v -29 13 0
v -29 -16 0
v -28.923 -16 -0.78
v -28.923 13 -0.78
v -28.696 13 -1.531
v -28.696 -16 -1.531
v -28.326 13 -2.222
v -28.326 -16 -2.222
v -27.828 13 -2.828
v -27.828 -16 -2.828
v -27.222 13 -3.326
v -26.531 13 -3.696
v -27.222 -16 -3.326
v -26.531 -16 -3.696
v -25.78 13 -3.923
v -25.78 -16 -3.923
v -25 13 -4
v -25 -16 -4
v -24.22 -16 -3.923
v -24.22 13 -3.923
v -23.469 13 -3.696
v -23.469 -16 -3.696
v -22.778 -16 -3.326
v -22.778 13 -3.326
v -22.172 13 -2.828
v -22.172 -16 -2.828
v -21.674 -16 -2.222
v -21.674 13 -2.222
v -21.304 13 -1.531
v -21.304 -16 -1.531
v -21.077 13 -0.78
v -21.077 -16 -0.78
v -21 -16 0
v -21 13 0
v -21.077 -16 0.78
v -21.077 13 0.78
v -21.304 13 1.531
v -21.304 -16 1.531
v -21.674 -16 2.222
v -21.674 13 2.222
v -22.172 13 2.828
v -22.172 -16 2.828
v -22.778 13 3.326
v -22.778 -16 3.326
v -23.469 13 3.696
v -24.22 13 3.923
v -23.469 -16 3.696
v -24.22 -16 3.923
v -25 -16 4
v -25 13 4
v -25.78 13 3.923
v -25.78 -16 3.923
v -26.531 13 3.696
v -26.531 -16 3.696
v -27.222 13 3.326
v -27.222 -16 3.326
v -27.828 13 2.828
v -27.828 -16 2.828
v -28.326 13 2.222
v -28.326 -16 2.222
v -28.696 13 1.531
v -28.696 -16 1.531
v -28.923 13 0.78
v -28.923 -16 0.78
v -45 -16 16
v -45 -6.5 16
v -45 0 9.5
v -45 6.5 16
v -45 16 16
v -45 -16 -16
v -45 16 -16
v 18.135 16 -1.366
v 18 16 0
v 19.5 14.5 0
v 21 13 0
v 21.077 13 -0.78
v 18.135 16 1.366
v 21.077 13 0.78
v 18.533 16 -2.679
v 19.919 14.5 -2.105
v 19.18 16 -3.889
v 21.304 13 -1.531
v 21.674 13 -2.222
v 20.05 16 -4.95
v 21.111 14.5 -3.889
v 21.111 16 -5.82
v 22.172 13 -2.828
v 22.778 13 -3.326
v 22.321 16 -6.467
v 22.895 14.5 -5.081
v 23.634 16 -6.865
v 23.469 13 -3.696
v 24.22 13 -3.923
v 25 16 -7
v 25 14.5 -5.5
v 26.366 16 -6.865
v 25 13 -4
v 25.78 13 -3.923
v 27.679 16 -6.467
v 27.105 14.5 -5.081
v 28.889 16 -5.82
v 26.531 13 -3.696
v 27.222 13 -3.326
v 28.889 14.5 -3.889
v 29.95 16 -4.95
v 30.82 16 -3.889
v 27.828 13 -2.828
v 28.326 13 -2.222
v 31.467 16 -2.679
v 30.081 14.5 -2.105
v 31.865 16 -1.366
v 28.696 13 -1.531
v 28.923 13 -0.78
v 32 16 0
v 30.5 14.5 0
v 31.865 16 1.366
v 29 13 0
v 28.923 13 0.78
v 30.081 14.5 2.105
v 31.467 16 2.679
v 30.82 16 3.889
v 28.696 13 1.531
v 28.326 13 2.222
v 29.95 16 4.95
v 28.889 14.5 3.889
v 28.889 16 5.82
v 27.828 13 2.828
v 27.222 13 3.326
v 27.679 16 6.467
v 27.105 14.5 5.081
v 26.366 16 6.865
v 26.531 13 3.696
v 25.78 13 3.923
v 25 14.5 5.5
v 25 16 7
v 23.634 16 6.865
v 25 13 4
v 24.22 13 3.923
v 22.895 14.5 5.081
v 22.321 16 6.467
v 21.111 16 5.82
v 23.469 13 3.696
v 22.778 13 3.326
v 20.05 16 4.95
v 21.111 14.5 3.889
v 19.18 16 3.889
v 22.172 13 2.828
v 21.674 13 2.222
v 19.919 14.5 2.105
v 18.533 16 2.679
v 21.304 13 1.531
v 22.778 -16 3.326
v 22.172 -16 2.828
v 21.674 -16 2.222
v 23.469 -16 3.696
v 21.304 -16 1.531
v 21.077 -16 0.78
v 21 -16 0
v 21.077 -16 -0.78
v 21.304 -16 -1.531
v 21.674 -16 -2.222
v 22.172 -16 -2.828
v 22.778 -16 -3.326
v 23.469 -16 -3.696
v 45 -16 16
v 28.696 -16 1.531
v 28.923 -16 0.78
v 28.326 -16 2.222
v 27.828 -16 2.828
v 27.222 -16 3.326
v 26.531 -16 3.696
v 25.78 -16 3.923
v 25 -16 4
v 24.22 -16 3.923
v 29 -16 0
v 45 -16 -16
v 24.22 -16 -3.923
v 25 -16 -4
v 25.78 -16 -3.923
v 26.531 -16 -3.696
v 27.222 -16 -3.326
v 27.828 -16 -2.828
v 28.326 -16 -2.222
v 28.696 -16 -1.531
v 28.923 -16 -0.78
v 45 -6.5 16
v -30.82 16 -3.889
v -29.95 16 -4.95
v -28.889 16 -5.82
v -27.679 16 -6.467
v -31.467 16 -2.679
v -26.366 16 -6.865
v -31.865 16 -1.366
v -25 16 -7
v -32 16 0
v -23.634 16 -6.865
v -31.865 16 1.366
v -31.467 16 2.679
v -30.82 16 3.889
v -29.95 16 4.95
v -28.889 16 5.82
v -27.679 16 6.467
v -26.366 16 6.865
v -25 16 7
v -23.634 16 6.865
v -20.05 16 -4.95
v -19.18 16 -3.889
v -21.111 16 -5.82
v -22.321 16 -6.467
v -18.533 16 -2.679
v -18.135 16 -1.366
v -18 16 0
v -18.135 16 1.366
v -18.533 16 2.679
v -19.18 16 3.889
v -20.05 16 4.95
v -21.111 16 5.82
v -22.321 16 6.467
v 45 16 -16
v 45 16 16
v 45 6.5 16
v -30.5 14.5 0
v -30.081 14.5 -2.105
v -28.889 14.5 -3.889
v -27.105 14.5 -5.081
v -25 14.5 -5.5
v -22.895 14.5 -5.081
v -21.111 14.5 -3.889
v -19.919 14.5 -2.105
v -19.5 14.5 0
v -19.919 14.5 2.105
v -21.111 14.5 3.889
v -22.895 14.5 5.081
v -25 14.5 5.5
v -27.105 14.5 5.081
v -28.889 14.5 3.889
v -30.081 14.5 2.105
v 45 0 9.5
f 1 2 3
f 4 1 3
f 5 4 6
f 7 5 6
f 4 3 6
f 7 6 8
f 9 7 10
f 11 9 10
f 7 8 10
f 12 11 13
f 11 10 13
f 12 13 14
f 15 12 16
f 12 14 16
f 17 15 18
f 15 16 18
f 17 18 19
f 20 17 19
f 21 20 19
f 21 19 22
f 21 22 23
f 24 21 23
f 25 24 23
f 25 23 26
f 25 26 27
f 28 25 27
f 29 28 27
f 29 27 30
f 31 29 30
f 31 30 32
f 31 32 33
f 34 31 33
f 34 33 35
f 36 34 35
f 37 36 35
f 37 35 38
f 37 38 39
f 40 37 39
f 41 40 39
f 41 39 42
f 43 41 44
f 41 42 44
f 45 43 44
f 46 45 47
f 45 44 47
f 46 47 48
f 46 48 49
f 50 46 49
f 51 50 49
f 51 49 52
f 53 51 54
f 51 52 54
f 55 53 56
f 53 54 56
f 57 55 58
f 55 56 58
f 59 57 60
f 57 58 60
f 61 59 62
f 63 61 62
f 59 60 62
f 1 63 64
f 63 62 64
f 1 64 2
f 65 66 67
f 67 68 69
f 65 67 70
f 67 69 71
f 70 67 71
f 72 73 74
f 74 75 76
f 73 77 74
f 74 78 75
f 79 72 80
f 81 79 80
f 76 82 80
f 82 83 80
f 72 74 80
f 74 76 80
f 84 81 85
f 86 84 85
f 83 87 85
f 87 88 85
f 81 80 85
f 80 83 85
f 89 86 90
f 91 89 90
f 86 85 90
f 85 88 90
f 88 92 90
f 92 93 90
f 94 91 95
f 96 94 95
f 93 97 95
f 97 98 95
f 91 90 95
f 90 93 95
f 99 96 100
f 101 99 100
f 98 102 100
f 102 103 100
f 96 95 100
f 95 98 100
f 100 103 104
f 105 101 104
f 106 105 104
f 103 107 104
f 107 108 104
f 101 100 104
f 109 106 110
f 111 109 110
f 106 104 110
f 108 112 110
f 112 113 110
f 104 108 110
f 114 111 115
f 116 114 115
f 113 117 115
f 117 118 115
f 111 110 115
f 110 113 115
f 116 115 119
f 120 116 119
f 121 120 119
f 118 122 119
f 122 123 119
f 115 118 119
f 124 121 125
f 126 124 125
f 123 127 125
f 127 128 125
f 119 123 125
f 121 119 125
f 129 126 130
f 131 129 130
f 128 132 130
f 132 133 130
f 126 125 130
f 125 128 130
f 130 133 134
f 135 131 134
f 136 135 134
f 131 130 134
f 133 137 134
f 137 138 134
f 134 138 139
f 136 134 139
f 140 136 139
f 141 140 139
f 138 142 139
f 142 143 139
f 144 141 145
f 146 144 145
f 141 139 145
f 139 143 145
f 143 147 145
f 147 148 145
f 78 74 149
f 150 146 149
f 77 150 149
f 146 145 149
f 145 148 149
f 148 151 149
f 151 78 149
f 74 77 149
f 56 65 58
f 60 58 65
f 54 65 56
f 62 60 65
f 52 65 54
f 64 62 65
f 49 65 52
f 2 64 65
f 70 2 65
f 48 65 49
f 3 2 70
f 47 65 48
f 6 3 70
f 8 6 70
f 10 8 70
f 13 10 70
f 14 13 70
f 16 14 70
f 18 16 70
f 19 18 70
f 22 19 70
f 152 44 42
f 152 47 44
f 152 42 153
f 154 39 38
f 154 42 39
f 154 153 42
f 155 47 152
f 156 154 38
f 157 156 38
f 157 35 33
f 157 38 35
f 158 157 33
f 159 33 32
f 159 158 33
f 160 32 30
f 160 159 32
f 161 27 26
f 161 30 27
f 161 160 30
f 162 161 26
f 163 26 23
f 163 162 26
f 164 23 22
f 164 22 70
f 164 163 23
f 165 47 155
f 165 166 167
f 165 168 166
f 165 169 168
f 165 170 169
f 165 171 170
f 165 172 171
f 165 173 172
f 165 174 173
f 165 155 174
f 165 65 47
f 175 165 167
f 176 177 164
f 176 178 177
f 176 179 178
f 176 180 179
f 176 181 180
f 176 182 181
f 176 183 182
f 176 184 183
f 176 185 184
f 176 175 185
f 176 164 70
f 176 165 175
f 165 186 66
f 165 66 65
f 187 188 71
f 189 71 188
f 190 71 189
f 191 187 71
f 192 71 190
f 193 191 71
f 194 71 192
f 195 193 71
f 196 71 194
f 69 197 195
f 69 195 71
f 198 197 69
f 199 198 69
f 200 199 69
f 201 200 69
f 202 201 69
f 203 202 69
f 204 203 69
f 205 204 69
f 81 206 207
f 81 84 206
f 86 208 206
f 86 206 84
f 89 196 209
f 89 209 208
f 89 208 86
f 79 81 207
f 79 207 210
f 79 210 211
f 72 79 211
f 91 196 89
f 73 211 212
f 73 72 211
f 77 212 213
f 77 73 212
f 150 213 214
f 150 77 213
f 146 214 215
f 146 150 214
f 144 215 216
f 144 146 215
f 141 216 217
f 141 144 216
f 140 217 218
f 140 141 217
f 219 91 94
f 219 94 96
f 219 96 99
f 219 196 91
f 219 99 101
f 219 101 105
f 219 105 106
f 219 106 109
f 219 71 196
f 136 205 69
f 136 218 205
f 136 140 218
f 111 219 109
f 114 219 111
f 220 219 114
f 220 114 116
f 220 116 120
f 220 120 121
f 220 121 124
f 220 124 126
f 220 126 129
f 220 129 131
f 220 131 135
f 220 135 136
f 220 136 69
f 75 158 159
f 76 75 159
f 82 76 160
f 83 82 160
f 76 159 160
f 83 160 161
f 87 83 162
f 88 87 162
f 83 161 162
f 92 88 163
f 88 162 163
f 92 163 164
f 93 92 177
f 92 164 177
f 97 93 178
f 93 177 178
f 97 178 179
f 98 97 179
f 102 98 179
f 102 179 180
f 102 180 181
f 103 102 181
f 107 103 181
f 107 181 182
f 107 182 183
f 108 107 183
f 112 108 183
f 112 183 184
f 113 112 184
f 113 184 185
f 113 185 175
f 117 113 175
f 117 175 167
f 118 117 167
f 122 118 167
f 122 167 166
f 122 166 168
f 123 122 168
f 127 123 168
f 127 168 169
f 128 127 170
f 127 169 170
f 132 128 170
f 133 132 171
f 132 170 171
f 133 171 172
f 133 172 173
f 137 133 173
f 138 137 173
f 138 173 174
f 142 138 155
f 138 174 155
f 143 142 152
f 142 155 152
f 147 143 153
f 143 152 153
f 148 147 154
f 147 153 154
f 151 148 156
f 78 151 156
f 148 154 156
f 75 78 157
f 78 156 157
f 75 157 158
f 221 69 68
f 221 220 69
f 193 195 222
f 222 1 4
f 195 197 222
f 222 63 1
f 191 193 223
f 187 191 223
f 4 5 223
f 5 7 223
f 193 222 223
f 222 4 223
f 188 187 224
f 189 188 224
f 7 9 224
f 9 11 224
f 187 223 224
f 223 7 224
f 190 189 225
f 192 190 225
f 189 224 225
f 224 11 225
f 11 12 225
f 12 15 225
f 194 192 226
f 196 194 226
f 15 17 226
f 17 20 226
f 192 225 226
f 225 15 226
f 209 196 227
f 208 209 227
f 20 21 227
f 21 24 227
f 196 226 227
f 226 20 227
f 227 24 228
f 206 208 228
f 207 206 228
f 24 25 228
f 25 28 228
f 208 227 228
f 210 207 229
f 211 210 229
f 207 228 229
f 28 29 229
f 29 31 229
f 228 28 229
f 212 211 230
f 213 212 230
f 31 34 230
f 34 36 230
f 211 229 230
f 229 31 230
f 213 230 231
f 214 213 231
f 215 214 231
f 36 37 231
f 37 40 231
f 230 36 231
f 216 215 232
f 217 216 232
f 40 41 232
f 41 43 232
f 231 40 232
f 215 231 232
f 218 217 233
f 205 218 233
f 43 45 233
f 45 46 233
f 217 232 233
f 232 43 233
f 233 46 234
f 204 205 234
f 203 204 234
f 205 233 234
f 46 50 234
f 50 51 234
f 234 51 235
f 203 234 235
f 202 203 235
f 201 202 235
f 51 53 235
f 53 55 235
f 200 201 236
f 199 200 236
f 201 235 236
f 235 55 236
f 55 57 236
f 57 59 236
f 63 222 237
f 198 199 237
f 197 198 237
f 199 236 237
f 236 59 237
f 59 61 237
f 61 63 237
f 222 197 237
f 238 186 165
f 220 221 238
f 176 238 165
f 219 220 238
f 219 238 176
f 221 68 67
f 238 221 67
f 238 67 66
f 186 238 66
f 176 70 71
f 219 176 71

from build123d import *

# Parameters (mm, degrees)
BOSS_EXTRUDE1_DEPTH   = 45
F_1_0MM_DOWEL_HOLE1_D = 8
CHAMFER1_SIZE         = 3


with BuildPart() as part:
    # Sketch1 → Boss-Extrude1 (new, symmetric)
    with BuildSketch(Plane(origin=(0, 0, 0), x_dir=(0, 0, -1), z_dir=(1, 0, 0))):
        Polygon((-16, 16), (-16, 6.5), (-9.5, 0), (-16, -6.5), (-16, -16), (16, -16), (16, 16), align=None)
    extrude(amount=BOSS_EXTRUDE1_DEPTH, both=True)

    # Ø1.0mm Dowel Hole1 (through all)
    with Locations(Plane(origin=(0, 16, 0), x_dir=(1, 0, 0), z_dir=(0, 1, 0))):
        with Locations((25, 0), (-25, 0)):
            Hole(F_1_0MM_DOWEL_HOLE1_D / 2)

    # Chamfer1
    chamfer1_edges = [part.edges().sort_by_distance(p)[0] for p in [
        (-21, 16, 0),
        (29, 16, 0),
    ]]
    chamfer(chamfer1_edges, length=CHAMFER1_SIZE)


solid = part.part
